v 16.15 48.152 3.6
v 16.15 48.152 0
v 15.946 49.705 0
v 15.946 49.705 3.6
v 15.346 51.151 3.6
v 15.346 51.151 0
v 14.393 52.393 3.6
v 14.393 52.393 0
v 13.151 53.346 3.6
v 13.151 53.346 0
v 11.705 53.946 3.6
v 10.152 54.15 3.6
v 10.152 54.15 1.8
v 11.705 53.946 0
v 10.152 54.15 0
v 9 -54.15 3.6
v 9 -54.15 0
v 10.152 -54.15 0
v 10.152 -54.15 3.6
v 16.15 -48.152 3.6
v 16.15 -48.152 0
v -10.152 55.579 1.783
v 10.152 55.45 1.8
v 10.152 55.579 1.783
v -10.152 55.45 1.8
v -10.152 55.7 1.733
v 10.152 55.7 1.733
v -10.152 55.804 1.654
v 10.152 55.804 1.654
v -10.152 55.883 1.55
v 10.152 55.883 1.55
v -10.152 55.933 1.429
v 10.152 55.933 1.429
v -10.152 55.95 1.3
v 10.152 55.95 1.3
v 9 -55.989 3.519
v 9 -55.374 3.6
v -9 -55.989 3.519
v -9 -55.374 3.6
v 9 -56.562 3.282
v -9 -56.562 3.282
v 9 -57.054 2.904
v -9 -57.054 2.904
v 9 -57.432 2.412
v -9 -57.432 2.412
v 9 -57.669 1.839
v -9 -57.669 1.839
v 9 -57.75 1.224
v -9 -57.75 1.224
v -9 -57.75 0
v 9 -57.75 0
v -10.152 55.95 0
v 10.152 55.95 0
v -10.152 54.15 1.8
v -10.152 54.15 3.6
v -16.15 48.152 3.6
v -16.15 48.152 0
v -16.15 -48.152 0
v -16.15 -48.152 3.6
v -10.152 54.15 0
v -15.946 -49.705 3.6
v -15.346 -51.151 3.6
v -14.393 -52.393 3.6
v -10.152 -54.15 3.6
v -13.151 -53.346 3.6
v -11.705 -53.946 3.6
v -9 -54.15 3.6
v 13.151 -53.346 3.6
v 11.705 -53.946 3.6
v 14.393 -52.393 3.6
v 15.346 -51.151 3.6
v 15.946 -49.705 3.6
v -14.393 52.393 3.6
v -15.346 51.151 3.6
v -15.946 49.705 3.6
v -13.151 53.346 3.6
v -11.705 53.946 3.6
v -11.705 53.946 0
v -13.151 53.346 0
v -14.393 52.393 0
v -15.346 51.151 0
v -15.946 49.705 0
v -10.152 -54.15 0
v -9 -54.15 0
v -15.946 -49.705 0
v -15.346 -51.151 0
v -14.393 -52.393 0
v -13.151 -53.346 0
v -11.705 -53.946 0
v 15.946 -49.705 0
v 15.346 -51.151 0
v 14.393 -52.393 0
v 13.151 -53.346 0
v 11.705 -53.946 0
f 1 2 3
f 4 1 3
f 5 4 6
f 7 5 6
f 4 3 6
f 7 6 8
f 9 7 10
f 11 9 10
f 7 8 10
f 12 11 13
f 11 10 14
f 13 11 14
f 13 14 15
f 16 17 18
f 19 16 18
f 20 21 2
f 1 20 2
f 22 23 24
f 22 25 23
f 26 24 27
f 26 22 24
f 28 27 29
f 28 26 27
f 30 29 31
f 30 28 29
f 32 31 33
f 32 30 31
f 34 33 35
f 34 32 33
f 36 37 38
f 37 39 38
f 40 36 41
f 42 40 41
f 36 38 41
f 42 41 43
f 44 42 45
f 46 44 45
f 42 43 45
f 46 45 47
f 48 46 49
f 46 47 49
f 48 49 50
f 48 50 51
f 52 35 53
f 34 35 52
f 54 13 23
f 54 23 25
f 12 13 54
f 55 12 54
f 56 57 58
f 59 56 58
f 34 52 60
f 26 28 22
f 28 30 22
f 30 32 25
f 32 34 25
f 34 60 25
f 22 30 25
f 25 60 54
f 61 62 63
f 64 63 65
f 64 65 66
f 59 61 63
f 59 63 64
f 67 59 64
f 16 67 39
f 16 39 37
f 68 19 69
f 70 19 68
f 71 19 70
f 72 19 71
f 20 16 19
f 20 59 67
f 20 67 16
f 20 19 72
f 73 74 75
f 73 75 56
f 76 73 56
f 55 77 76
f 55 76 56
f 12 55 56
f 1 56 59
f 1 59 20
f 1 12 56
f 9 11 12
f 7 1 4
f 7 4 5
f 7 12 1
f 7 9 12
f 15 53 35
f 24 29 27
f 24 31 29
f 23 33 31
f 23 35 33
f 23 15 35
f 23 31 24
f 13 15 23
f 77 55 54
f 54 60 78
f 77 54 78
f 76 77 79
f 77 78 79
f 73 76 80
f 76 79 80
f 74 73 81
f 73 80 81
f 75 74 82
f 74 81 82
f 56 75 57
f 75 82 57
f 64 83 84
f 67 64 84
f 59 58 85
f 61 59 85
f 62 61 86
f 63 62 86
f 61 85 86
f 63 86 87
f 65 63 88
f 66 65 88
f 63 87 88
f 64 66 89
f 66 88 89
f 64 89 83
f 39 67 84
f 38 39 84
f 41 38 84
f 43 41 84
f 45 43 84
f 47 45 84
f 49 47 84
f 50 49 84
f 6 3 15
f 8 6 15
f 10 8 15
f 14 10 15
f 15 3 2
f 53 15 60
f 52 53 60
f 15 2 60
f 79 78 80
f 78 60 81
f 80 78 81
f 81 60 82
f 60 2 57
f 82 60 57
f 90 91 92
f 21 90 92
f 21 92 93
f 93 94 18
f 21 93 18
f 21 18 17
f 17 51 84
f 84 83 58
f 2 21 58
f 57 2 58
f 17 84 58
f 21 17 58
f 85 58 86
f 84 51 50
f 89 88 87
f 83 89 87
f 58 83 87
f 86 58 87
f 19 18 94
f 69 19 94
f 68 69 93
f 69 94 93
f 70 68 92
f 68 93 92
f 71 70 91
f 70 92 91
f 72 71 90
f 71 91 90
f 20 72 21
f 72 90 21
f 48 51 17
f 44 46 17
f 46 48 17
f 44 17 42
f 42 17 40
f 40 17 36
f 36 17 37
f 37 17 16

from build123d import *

# Parameters (mm, degrees)
F2_DEPTH = 3.6
F4_DEPTH = 3.6
F5_W     = 20.3048
F5_H     = 1.8
F6_DEPTH = 1.8
F7_R     = 2.376
F8_R     = 0.5


with BuildPart() as f2:
    # F1 (on Top) → F2 (new body)
    with BuildSketch(Plane.XY):
        with BuildLine():
            Line((-10.1524, -54.15), (10.1524, -54.15))
            ThreePointArc((10.1524, -54.15), (14.3933436308, -52.3933436308), (16.15, -48.1524))
            Line((16.15, -48.1524), (16.15, 48.1524))
            ThreePointArc((16.15, 48.1524), (14.3933436308, 52.3933436308), (10.1524, 54.15))
            Line((10.1524, 54.15), (-10.1524, 54.15))
            ThreePointArc((-10.1524, 54.15), (-14.3933436308, 52.3933436308), (-16.15, 48.1524))
            Line((-16.15, 48.1524), (-16.15, -48.1524))
            ThreePointArc((-16.15, -48.1524), (-14.3933436308, -52.3933436308), (-10.1524, -54.15))
        make_face()
    extrude(amount=F2_DEPTH)

    # F3 (on face) → F4 (join)
    with BuildSketch(Plane.XZ.offset(54.15)):
        Polygon((9, 3.6), (-9, 3.6), (-9, 1.8), (-9, 0), (9, 0), (9, 1.8), align=None)
    extrude(amount=F4_DEPTH)

    # F5 (on face) → F6 (join)
    with BuildSketch(Plane(origin=(0, 54.15, 0), x_dir=(-1, 0, 0), z_dir=(0, 1, 0))):
        with Locations((0, 0.9)):
            Rectangle(F5_W, F5_H)
    extrude(amount=F6_DEPTH)

    # F7
    f7_edges = [f2.edges().sort_by_distance(p)[0] for p in [
        (0, -57.75, 3.6),
    ]]
    fillet(f7_edges, radius=F7_R)

    # F8
    f8_edges = [f2.edges().sort_by_distance(p)[0] for p in [
        (0, 55.95, 1.8),
    ]]
    fillet(f8_edges, radius=F8_R)


solid = f2.part
